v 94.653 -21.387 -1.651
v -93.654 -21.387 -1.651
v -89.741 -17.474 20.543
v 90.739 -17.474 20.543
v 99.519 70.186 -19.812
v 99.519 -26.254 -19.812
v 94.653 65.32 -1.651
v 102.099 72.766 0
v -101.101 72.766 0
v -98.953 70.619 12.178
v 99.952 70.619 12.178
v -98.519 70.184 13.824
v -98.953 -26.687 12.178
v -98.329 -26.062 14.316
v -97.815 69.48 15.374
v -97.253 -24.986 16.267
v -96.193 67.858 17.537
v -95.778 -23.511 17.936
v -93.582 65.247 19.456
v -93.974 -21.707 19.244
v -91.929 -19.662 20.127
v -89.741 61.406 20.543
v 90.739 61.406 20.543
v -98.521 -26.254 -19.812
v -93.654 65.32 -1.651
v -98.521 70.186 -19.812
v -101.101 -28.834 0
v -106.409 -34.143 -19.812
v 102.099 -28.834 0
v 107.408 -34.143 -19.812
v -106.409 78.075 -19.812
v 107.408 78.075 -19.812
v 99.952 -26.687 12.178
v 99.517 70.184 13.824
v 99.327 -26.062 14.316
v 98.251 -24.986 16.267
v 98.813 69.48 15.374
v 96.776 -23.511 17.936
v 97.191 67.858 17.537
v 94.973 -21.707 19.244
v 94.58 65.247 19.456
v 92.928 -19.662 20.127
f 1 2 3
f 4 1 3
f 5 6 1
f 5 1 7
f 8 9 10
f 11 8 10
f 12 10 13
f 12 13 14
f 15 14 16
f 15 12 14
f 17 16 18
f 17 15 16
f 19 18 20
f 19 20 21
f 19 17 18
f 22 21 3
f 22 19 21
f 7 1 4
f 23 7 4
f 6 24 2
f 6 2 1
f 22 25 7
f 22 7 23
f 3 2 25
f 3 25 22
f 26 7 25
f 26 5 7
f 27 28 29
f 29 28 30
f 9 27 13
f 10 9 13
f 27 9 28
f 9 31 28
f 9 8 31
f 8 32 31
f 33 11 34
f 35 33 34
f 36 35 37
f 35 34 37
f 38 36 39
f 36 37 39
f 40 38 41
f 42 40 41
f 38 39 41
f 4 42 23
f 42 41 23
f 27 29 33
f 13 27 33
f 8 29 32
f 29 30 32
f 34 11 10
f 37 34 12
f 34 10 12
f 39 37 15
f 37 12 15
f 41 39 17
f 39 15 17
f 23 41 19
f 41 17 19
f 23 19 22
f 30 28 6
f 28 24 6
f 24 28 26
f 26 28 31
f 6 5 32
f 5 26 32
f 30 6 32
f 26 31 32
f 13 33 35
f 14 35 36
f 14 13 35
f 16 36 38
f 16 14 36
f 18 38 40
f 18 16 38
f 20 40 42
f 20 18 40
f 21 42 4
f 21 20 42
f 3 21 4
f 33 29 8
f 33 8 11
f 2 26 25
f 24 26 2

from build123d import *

# Parameters (mm, degrees)
F0_W          = 203.2
F0_H          = 101.6
F1_DEPTH      = 20.574
F1_TAPER      = 10
F1_DEPTH_BACK = 19.812
F1_TAPER_BACK = -15
F2_T          = -7.62
F3_T1_DEPTH   = 238.5707586616
F3_T3_DEPTH   = 136.9707586616


# Not quite as in the source:
# - a fillet or chamfer that OpenCascade refuses, or shapes differently, is made with other operations: its cross-section is extruded or revolved along the edge and cut away or added


with BuildPart() as f1:
    # F0 (on Top) → F1 (new body, two sides)
    with BuildSketch(Plane.XY) as f1_sk:
        with Locations((0.4991553724, 21.9660702551)):
            Rectangle(F0_W, F0_H)
    extrude(amount=F1_DEPTH, taper=F1_TAPER)
    extrude(f1_sk.sketch, amount=-F1_DEPTH_BACK, taper=F1_TAPER_BACK)

    # F2
    f2_openings = [f1.faces().sort_by_distance(p)[0] for p in [
        (0.499155, 21.96607, 20.574),
        (0.499155, 21.96607, -19.812),
    ]]
    offset(amount=F2_T, openings=f2_openings, kind=Kind.INTERSECTION)

    # F3: fillet of radius 10.16 on 4 edges, made by hand

    # F3_s2 → F3_t1 (cut)
    with BuildSketch(Plane.YZ.offset(-118.7862239584)):
        with BuildLine():
            ThreePointArc((70.6187134719, 12.1782654851), (67.1437888157, 18.1970115421), (60.6130667013, 20.574))
            Line((60.6130667013, 20.574), (69.138318954, 20.574))
            Line((69.138318954, 20.574), (70.6187134719, 12.1782654851))
        make_face()
        with BuildLine():
            ThreePointArc((-26.6865729616, 12.1782654851), (-23.2116483054, 18.1970115421), (-16.680926191, 20.574))
            Line((-16.680926191, 20.574), (-25.2061784438, 20.574))
            Line((-25.2061784438, 20.574), (-26.6865729616, 12.1782654851))
        make_face()
    extrude(amount=F3_T1_DEPTH, mode=Mode.SUBTRACT)

    # F3_s4 → F3_t3 (cut)
    with BuildSketch(Plane.XZ.offset(-90.4514495859)):
        with BuildLine():
            ThreePointArc((99.9517985891, 12.1782654851), (96.4768739329, 18.1970115421), (89.9461518185, 20.574))
            Line((89.9461518185, 20.574), (98.4714040713, 20.574))
            Line((98.4714040713, 20.574), (99.9517985891, 12.1782654851))
        make_face()
        with BuildLine():
            ThreePointArc((-98.9534878444, 12.1782654851), (-95.4785631882, 18.1970115421), (-88.9478410738, 20.574))
            Line((-88.9478410738, 20.574), (-97.4730933265, 20.574))
            Line((-97.4730933265, 20.574), (-98.9534878444, 12.1782654851))
        make_face()
    extrude(amount=F3_T3_DEPTH, mode=Mode.SUBTRACT)


solid = f1.part
